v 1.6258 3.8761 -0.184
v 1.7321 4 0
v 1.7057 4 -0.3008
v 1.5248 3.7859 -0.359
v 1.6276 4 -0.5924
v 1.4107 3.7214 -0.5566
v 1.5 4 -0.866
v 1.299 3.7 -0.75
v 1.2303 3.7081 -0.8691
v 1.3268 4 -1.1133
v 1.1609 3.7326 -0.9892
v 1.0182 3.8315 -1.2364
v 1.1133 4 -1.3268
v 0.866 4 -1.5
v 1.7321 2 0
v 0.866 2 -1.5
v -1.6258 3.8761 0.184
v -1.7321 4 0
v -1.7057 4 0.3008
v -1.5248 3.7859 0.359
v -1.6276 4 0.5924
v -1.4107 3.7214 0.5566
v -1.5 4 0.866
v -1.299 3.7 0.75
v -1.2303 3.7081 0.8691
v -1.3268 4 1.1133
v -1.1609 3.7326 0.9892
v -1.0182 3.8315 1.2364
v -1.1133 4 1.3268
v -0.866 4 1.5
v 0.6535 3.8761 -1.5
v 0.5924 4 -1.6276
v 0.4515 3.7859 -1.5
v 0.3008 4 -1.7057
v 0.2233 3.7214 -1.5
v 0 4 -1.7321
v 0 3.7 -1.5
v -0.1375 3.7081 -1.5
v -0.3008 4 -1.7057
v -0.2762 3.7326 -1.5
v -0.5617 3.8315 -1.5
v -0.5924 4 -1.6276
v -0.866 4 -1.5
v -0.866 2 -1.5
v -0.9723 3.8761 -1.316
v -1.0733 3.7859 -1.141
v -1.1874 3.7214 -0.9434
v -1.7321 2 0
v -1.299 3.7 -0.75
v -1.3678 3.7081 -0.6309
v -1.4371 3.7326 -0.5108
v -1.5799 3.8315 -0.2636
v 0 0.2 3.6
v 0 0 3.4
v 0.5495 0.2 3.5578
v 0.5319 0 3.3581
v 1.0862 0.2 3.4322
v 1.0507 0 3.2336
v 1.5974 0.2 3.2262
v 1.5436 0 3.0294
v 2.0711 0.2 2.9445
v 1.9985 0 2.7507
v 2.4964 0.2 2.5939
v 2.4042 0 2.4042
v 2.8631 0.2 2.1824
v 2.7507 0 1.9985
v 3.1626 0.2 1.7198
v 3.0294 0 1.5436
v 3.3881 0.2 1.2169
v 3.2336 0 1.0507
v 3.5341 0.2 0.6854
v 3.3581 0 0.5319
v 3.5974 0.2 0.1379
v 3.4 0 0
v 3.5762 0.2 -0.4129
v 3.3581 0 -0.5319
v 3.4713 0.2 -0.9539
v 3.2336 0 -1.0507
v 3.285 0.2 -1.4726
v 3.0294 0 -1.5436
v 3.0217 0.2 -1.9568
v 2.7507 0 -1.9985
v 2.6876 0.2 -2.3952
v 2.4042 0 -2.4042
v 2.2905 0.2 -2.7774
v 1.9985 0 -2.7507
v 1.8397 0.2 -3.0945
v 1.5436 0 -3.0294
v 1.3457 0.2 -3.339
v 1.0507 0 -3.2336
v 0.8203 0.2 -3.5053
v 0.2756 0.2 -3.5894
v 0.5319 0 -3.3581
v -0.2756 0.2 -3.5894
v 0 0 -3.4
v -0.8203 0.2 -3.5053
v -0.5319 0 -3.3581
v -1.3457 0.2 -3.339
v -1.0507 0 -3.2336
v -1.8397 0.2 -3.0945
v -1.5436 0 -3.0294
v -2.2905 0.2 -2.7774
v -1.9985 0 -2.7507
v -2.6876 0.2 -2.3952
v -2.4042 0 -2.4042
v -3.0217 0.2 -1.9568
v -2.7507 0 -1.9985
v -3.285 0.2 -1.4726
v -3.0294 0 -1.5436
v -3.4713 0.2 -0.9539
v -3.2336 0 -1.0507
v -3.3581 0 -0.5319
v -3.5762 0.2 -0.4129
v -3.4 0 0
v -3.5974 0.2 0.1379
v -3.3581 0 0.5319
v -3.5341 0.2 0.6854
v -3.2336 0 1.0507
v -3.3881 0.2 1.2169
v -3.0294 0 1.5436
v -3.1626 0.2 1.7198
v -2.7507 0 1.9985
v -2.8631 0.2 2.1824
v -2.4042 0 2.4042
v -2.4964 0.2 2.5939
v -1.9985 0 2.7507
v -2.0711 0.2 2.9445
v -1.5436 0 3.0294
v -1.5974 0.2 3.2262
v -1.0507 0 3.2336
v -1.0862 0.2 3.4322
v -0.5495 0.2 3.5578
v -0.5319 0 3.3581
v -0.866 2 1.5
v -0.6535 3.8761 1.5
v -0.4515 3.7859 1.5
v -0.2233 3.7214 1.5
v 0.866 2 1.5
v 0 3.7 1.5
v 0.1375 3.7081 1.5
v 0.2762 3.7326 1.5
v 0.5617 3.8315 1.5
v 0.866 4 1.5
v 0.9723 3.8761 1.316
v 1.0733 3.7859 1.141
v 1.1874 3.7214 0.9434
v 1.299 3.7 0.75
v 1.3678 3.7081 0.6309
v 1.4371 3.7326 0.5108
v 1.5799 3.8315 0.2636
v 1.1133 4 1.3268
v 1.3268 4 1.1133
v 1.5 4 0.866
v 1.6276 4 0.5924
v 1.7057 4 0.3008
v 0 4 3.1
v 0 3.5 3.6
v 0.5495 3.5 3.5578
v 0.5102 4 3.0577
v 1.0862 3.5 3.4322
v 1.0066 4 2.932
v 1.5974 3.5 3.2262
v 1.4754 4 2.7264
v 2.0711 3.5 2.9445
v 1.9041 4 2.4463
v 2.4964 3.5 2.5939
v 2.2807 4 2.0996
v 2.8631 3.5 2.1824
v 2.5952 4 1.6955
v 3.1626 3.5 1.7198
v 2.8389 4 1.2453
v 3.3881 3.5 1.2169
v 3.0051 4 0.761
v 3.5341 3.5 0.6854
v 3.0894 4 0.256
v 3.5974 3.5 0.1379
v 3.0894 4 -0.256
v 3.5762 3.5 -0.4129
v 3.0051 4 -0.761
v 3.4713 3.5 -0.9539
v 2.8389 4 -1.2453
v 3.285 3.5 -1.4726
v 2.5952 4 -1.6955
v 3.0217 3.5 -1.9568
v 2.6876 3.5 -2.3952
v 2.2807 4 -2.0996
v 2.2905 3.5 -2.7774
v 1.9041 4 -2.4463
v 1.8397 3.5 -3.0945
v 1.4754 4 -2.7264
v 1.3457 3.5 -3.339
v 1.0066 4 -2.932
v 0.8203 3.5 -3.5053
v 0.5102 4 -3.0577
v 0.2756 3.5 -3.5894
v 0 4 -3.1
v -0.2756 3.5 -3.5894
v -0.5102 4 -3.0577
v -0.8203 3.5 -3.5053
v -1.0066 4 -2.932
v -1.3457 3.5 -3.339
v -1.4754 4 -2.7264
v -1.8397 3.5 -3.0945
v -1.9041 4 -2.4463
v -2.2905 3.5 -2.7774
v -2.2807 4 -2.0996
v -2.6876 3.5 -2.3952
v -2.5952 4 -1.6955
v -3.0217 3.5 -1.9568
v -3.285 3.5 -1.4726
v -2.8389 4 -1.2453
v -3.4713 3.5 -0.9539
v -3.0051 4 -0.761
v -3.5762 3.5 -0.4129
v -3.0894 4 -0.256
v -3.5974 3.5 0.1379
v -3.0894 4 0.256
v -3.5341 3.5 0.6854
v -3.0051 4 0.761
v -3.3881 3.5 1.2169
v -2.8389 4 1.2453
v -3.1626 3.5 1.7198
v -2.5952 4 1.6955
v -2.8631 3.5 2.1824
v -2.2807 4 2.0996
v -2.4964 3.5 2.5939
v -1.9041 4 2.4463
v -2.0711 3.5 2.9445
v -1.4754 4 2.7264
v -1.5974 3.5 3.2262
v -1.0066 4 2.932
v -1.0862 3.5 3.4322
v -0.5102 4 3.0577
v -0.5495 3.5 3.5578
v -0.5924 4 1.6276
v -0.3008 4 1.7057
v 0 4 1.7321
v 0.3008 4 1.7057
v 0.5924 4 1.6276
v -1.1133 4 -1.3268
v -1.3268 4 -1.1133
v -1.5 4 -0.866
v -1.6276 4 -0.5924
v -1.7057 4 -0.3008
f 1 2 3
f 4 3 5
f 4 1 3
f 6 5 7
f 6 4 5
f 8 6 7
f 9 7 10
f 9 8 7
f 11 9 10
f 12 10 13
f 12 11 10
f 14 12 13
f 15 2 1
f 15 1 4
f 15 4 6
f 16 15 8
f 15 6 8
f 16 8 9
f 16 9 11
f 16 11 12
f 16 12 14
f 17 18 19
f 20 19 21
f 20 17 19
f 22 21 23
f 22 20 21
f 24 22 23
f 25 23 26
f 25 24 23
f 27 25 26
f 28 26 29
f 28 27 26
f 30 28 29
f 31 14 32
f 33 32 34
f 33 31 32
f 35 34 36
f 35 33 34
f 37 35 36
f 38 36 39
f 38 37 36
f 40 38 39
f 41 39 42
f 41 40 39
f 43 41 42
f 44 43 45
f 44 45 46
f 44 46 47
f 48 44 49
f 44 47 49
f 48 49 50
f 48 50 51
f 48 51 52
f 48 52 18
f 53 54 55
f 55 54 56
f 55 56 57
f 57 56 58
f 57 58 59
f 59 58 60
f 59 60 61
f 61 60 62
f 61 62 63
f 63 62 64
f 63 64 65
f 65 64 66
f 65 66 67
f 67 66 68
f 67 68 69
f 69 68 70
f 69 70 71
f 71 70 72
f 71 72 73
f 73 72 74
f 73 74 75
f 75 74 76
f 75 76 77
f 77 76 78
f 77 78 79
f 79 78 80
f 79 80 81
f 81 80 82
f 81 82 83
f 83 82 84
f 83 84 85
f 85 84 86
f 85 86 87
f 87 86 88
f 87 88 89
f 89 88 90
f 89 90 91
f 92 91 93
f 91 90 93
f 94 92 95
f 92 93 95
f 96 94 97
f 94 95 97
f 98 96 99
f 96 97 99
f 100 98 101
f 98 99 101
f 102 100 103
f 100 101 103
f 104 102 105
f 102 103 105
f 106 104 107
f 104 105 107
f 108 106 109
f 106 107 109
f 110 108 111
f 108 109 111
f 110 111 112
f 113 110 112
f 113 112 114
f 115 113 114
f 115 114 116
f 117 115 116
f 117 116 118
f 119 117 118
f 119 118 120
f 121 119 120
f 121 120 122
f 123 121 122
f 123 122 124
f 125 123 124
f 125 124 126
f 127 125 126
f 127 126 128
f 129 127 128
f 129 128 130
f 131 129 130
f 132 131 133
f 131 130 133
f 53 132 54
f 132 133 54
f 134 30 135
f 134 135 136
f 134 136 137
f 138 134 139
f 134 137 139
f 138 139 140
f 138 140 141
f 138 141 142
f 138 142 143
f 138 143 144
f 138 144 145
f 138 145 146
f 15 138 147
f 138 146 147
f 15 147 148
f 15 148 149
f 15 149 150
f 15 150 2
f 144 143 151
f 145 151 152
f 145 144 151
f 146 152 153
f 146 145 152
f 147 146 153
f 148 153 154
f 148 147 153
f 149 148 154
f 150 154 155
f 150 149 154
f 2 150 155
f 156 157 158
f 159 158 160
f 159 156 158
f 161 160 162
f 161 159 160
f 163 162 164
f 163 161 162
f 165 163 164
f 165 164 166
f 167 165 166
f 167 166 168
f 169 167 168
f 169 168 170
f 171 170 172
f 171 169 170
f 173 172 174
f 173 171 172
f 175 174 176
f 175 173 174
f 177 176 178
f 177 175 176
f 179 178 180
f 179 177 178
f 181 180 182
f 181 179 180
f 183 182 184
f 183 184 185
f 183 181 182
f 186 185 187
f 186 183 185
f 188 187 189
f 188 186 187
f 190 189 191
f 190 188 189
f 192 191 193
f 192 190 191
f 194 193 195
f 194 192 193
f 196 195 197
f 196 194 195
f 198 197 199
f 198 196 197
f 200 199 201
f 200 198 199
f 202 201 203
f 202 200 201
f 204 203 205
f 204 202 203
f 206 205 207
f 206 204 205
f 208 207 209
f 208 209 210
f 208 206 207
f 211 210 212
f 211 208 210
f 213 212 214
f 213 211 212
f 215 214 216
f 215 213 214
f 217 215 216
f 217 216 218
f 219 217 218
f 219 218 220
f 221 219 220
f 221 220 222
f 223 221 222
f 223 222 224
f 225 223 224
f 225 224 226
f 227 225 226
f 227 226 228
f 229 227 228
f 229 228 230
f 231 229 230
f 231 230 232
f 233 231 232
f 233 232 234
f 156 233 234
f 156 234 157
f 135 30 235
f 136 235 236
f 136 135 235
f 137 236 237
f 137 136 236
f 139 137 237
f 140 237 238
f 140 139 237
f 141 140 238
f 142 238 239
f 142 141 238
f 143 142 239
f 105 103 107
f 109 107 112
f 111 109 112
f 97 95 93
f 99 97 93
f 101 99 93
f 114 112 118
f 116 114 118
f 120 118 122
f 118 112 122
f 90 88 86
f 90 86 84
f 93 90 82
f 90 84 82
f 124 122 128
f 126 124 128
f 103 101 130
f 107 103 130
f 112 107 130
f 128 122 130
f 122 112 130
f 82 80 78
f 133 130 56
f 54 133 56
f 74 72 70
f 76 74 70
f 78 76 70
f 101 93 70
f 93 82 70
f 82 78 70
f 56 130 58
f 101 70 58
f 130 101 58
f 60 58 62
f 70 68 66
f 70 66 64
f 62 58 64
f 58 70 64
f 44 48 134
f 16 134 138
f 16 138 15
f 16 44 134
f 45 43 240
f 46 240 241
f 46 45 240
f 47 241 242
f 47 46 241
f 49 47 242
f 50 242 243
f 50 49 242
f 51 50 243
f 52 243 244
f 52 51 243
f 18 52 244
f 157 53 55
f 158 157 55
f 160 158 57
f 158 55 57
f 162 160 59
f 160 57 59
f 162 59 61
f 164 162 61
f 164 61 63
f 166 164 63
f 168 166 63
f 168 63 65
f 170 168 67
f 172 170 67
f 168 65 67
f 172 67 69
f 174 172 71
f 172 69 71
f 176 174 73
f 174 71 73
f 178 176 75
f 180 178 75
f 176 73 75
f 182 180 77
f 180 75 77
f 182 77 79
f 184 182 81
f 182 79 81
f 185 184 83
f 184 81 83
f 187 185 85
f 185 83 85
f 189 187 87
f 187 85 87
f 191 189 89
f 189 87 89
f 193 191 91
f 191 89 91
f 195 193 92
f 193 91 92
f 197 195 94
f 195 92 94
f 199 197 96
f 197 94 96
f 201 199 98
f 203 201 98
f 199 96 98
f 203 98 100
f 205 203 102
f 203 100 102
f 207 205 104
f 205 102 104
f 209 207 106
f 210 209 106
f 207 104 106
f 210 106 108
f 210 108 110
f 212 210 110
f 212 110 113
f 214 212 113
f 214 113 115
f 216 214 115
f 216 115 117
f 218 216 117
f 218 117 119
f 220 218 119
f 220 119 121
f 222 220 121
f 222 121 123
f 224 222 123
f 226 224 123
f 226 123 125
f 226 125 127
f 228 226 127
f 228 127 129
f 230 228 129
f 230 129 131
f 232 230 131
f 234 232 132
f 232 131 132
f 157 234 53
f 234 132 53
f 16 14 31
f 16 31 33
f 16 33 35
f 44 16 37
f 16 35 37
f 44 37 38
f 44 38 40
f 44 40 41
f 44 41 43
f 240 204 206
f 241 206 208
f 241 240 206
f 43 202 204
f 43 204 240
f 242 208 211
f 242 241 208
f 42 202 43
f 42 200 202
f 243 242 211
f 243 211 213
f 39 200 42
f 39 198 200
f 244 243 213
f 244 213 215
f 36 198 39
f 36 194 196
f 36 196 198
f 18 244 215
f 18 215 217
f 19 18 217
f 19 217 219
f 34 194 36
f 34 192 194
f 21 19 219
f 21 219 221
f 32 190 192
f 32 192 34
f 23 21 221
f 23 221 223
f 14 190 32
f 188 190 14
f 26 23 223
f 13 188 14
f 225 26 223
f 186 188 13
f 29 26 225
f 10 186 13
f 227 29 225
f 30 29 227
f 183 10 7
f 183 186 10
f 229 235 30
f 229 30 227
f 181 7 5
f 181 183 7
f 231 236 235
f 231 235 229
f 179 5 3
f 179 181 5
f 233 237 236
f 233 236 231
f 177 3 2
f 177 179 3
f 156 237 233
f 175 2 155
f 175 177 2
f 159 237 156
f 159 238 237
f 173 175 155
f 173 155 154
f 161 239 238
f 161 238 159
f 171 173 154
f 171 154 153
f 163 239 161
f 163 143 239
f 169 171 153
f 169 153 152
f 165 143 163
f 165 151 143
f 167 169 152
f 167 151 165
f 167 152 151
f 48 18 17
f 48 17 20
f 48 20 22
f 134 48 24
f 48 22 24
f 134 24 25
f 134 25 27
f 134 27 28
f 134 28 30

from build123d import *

# Parameters (mm, degrees)
SKETCH_1_R          = 3.6
EXTRUDE_1_DEPTH     = 4
CUT_EXTRUDE_1_DEPTH = 2
SKETCH_3_R          = 1.732050808
SKETCH_4_R          = 1.5
CHAMFER_1_SIZE      = 0.5
CHAMFER_2_SIZE      = 0.2


with BuildPart() as part:
    # 草图1 → 凸台-拉伸1 (new body)
    with BuildSketch(Plane(origin=(0, 0, 0), x_dir=(1, 0, 0), z_dir=(0, 1, 0))):
        with Locations(Location((0, 0, 0), (0, 0, 270))):
            Circle(SKETCH_1_R)
    extrude(amount=EXTRUDE_1_DEPTH)

    # 草图2 → 切除-拉伸1 (cut)
    with BuildSketch(Plane(origin=(0, 4, 0), x_dir=(1, 0, 0), z_dir=(0, 1, 0))):
        Polygon((1.732050808, 0), (0.866025404, 1.5), (-0.866025404, 1.5), (-1.732050808, 0), (-0.866025404, -1.5), (0.866025404, -1.5), align=None)
    extrude(amount=-CUT_EXTRUDE_1_DEPTH, mode=Mode.SUBTRACT)

    # 草图3 → 切除-放样1 section 0
    with BuildSketch(Plane(origin=(0, 4, 0), x_dir=(1, 0, 0), z_dir=(0, 1, 0))):
        Circle(SKETCH_3_R)
    # 草图4 → 切除-放样1 section 1
    with BuildSketch(Plane(origin=(0, 3.7, 0), x_dir=(1, 0, 0), z_dir=(0, 1, 0))):
        Circle(SKETCH_4_R)
    loft(mode=Mode.SUBTRACT)

    # 倒角1
    chamfer_1_edges = [part.edges().sort_by_distance(p)[0] for p in [
        (0, 4, -3.6),
    ]]
    chamfer(chamfer_1_edges, length=CHAMFER_1_SIZE)

    # 倒角2
    chamfer_2_edges = [part.edges().sort_by_distance(p)[0] for p in [
        (0, 0, -3.6),
    ]]
    chamfer(chamfer_2_edges, length=CHAMFER_2_SIZE)


solid = part.part
